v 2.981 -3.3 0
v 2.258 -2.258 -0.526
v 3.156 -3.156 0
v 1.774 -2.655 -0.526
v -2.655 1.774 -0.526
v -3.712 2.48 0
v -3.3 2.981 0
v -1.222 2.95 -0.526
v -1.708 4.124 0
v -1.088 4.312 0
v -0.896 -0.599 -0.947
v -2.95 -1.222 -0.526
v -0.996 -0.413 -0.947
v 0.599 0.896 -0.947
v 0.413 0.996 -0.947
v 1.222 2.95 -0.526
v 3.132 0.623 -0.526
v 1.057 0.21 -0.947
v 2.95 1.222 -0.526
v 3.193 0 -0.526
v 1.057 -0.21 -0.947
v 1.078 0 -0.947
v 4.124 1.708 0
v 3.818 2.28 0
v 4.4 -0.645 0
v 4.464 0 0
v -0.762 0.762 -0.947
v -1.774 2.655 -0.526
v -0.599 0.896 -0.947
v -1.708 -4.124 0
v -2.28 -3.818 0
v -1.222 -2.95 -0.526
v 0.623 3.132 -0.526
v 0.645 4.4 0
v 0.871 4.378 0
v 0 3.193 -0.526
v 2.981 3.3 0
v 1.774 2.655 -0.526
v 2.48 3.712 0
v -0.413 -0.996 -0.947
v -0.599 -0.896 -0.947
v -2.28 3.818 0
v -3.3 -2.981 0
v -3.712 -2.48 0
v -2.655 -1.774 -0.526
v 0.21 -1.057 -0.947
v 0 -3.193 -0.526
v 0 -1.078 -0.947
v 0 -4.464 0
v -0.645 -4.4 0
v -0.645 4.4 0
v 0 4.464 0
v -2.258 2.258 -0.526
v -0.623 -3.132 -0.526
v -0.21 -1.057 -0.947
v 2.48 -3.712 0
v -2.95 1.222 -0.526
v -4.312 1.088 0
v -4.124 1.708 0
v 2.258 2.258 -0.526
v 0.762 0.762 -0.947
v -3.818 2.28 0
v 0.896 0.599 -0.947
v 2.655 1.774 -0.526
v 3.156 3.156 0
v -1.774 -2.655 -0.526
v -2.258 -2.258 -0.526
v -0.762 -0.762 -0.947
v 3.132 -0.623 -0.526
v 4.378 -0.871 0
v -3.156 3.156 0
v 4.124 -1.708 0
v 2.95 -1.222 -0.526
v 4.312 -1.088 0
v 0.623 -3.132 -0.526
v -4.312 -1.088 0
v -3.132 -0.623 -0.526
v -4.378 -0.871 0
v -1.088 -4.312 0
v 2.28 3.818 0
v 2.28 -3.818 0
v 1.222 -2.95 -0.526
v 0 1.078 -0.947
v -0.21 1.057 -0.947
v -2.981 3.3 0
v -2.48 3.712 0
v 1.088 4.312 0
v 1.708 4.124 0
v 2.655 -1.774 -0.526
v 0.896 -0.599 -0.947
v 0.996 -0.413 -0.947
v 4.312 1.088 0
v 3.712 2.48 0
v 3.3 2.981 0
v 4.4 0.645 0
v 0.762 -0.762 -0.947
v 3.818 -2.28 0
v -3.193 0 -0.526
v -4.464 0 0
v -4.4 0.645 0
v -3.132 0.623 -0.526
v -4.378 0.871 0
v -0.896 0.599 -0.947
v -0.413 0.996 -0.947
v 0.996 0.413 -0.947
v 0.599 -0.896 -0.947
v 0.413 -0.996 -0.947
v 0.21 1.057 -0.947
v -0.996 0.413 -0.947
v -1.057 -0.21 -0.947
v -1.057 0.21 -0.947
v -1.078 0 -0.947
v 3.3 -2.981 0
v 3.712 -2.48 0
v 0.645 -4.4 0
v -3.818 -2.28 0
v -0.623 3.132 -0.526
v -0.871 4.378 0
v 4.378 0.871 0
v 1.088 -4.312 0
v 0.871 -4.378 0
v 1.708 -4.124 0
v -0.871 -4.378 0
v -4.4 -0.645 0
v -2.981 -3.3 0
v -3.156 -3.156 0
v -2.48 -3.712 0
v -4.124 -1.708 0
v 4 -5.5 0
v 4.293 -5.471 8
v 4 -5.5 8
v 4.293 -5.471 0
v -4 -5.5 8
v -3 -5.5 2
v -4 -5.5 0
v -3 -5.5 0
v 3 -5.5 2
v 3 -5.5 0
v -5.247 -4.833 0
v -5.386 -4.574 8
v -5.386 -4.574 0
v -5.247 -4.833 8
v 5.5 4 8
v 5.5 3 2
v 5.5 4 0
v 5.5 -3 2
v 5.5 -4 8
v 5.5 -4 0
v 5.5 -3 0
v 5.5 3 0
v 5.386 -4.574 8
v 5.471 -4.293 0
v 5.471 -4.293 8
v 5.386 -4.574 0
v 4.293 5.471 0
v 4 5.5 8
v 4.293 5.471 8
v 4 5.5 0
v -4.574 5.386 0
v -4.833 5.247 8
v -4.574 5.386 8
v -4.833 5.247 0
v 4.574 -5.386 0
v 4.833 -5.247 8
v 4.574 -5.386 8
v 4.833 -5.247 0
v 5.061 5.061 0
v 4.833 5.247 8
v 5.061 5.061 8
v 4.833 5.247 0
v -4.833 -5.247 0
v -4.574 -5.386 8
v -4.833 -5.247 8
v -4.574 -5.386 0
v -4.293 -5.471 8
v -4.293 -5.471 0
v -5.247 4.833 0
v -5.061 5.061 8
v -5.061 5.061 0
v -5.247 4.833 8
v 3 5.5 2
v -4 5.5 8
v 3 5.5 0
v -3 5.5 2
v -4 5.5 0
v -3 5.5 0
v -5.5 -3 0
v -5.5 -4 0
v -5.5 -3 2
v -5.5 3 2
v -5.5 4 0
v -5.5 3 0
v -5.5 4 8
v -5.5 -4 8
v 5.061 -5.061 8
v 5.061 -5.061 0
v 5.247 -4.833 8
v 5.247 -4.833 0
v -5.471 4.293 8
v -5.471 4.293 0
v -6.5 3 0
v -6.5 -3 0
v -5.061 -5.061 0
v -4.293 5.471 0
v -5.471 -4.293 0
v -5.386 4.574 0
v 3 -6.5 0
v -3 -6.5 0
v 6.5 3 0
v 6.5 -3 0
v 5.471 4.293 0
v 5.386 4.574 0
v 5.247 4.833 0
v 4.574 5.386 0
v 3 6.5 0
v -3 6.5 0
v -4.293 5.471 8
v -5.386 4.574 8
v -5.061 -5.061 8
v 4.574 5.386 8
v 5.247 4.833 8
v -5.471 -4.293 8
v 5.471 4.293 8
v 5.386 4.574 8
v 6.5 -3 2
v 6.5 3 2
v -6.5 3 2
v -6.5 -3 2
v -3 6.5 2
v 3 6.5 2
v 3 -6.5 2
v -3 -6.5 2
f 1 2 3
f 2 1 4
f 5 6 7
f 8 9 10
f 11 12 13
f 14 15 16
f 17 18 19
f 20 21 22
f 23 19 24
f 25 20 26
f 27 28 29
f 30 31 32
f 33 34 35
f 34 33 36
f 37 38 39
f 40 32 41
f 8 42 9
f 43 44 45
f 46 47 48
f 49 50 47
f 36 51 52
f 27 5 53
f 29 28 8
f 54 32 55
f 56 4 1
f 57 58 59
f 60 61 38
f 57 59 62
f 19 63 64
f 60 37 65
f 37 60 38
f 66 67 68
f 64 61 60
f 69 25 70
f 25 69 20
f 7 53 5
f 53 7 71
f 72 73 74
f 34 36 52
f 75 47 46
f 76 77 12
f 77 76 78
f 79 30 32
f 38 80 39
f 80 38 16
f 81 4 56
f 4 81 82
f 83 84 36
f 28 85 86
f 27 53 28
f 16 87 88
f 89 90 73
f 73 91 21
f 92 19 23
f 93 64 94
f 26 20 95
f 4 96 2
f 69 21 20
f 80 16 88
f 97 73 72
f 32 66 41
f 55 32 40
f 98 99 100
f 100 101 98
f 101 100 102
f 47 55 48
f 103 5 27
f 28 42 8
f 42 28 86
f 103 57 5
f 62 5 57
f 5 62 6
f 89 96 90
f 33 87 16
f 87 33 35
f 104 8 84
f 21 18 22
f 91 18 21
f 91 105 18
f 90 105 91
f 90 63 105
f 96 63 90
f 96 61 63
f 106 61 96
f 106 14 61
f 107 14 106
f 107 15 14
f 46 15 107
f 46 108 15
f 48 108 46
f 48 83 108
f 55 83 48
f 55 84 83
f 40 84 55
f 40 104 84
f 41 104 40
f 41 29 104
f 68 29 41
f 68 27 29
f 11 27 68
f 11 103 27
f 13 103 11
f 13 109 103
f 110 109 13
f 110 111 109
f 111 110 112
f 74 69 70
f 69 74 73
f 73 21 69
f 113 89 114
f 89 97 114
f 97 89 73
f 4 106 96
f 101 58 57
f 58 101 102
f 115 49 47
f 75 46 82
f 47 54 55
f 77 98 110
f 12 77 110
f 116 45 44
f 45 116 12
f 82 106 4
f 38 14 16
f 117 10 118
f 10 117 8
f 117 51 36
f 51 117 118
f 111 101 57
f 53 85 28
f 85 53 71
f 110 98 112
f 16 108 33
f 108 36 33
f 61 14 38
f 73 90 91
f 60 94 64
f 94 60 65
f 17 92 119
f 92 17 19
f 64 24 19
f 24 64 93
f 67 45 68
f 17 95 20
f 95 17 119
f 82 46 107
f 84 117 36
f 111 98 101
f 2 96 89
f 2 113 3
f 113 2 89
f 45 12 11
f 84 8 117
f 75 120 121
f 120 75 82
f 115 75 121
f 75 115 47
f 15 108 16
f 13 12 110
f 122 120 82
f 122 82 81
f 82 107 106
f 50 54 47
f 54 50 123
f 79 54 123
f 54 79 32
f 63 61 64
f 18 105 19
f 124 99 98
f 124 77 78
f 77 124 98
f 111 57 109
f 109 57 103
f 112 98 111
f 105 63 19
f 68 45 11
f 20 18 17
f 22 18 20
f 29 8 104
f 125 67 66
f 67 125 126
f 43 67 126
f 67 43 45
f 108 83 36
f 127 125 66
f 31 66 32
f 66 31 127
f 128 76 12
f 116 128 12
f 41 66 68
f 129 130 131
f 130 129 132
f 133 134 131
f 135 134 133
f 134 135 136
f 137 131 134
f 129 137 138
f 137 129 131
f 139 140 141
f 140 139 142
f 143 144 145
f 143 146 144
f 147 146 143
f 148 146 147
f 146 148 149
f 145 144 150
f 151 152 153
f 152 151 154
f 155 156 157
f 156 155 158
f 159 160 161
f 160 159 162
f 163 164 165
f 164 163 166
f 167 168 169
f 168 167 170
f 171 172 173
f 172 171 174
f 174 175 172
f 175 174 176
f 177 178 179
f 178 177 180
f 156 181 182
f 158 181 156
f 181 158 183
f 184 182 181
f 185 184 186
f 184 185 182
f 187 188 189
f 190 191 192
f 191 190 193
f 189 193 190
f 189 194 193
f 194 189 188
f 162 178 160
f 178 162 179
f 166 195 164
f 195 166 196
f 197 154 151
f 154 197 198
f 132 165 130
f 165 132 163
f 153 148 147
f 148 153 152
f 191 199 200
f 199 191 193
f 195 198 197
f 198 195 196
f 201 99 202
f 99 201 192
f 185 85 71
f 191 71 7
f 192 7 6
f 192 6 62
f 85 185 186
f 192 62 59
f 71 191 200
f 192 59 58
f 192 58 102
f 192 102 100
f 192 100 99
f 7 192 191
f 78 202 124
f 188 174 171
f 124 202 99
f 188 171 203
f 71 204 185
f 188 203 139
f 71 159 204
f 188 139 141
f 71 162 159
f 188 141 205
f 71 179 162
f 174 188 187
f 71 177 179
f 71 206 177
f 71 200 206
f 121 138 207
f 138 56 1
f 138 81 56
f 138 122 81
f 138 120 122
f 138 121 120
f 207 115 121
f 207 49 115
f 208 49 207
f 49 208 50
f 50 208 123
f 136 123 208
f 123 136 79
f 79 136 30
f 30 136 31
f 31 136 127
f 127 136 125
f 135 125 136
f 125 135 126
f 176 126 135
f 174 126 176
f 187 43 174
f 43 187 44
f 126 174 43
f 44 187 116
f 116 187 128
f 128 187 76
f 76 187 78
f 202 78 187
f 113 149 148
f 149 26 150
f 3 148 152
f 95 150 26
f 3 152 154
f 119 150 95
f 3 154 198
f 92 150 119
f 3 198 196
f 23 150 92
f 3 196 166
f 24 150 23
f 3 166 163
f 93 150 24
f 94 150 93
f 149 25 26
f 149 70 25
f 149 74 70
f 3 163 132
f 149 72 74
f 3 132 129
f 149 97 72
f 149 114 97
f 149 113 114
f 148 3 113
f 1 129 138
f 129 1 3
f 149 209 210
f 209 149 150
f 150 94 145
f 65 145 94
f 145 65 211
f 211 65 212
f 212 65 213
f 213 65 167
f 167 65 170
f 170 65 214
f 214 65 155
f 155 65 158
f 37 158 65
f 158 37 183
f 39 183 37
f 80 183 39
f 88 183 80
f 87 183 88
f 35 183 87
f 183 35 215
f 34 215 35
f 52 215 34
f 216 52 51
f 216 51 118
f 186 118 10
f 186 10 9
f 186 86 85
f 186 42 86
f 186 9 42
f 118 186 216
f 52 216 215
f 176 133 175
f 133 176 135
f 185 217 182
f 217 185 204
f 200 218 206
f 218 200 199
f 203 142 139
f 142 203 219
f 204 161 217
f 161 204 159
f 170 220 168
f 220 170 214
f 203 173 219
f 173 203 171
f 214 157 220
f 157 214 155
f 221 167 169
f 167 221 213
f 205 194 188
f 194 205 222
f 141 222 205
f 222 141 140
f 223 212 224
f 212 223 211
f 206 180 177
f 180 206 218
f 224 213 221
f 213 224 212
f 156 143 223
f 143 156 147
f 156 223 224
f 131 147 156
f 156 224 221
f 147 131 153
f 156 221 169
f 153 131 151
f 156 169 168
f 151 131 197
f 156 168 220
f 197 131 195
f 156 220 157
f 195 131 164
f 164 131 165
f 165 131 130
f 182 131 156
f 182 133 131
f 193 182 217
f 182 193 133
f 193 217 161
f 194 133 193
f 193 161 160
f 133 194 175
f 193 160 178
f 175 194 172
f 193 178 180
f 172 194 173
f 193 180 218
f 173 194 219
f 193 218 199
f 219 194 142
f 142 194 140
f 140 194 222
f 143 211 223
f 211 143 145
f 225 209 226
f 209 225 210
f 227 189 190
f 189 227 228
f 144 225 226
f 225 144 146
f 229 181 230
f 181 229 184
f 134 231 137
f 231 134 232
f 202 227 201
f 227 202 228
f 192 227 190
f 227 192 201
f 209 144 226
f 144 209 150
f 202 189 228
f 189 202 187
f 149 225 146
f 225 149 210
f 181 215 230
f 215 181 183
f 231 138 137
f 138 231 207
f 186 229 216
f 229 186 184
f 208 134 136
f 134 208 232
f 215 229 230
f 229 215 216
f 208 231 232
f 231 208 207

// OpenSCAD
res = 32;

module button() {
    union() {
        hull() {
            for(x=[-1, 1]) {
                for(y=[-1, 1]) {
                    translate([4*x, 4*y, 0]) cylinder(d=3, h=8, $fn=res);
                }
            }
        }
        translate([0, 0, 1]) cube([13, 6, 2], center=true);
        translate([0, 0, 1]) cube([6, 13, 2], center=true);
        difference() {
            translate([0, 0, 10]) sphere(d=22, $fn=res);
            for(i=[-1, 1]) {
                translate([i*10, 0, 5]) cube([10, 20, 10], center=true);
                translate([0, i*10, 5]) cube([20, 10, 10], center=true);
            }
            translate([0, 0, 15]) cube([30, 30, 20], center=true);
        }
    }
}

module button_base() {
    difference() {
        union() {
            translate([0, 0, 1]) cube([80, 78, 2], center=true);
            for(i=[-1, 1]) {
                for(j=[-1, 1]) {
                    translate([i*31, j*35.5, 0]) cylinder(d=13, h=13.7, $fn=res);
                }
                translate([0, 0, 2+3]) rotate([0, 0, i*49]) cube([84, 6, 6], center=true);
                translate([i*31, 0, 2+3]) cube([6, 60, 6], center=true);
                translate([0, i*35.5, 2+3]) cube([51, 6, 6], center=true);
            }
        }
        for(i=[-1, 1]) {
            for(j=[-1, 1]) {
                translate([i*31, j*35.5, -1]) cylinder(d=3.5, h=17, $fn=res);
                translate([i*31, j*35.5, 11.2]) cylinder(d=6.7, h=5, $fn=6);
            }
        }
        translate([0, -42, 0]) cube([100, 5, 50], center=true);
    }
}

module case() {
    union() {
        difference() {
            union() {
                for(x=[-1, 1]) for(y=[-1, 1]) {
                   translate([x*(88-13)/2, y*(182-13)/2, 3]) {
                        difference() {
                            cylinder(d=10, h=34, $fn=res);  
                            translate([x*-5, 0, 40]) rotate([0, 45, 0]) cube([20, 20, 20], center=true);
                            translate([0, 0, 25]) cylinder(d=6.7, h=20, $fn=6);
                        }
                   }
                   translate([x*31, -48+y*35.5, 57-(3.35+3)]) cylinder(d=7, h=3.35, $fn=res);
               }
            }
            for(x=[-1, 1]) for(y=[-1, 1]) {
                translate([x*(88-13)/2, y*(182-13)/2, 1]) cylinder(d=3.5, h=55, $fn=res);
                translate([x*31, -48+y*35.5, 57-24]) cylinder(d=3.5, h=26, $fn=res);
                translate([x*31, -48+y*35.5, 57-3.3]) cylinder(d=5.8, h=5, $fn=res);
            }
        }
        difference() {
            translate([0, 0, 57/2]) render(convexity=2) hull() { for(x=[-1, 1]) for(y=[-1, 1]) for(z=[-1, 1]) translate([x*(88-10)/2, y*(182-10)/2, z*(57-10)/2]) sphere(d=10, $fn=res); }
            //translate([0, 0, 57/2]) cube([88, 182, 57], center=true);
            translate([0, 0, 57/2]) render(convexity=2) hull() { for(x=[-1, 1]) for(y=[-1, 1]) for(z=[-1, 1]) translate([x*(88-10)/2, y*(182-10)/2, z*(57-10)/2]) sphere(d=4, $fn=res); }
            //translate([0, 0, 57/2]) cube([88-6, 182-6, 57-6], center=true);
            for(x=[-3,3]) {
                for(y=[-3,3]) {
                    translate([x*10, y*10+46, 10]) cylinder(d=3.5, h=60, $fn=res);
                }
            }
            // Speaker holes
            translate([0, 46, 10]) {
                //cylinder(d=6, h=60, $fn=res);
                for(i=[0:2]) {
                    rotate([0, 0, i*120]) translate([0, 4, 0]) cylinder(d=6, h=60, $fn=res);
                }
                for(i=[0:8]) {
                    rotate([0, 0, i*40+20]) translate([0, 11, 0]) cylinder(d=6, h=60, $fn=res);
                }
                for(i=[0:14]) {
                    rotate([0, 0, i*24]) translate([0, 18, 0]) cylinder(d=6, h=60, $fn=res);
                }
                for(i=[0:19]) {
                    rotate([0, 0, i*18+9]) translate([0, 25, 0]) cylinder(d=6, h=60, $fn=res);
                }
                for(i=[0:23]) {
                    rotate([0, 0, i*15]) translate([0, 32, 0]) cylinder(d=6, h=60, $fn=res);
                }
            }
            
            translate([0, -100, 22]) rotate([-90, 0, 0]) cylinder(d=4, h=50, $fn=res);
            translate([-25, 0, 10]) {
                difference() {
                    cylinder(d=6.7+0.4, h=60, $fn=res);
                    for(i=[-1, 1]) {
                        translate([0, i*((5.9+0.4)/2+5), 48]) cube([10, 10, 10], center=true);
                    }
                }
            }
            translate([20, 0, 10]) cylinder(d=5.5, h=60, $fn=res);
            translate([28, -9.3/2, 10]) cube([4, 9.3, 60]);
            for(x=[0:3]) {
                for(y=[0:3]) {
                    hull() {
                        for(i=[-1, 1]) {
                            for(j=[-1, 1]) {
                                translate([-24+x*14.8+4*i, -73+y*14.8+4*j, 53]) cylinder(d=3.5, h=6, $fn=res);
                            }
                        }
                    }
                }
            }
            //translate([0, -45, 0]) cube([58.5, 69.5, 20], center=true);
            for(x=[-1, 1]) for(y=[-1, 1]) {
                translate([x*(88-13)/2, y*(182-13)/2, -1]) {
                    cylinder(d=3.5, h=44, $fn=res);
                    cylinder(d=5.8, h=4, $fn=res);
                }
                translate([x*31, -48+y*35.5, 57-3.3]) cylinder(d=5.8, h=5, $fn=res);
            }
        }
    }
}

module upper_half() {
    difference() {
        case();
        translate([0, 0, -5]) cube([85, 179, 57], center=true);
        translate([0, 0, -7]) cube([100, 200, 57], center=true);
        //translate([-100, -100, -100]) cube([100, 200, 200]);
    }
}

module lower_half() {
    difference() {
        case();
        difference() {
            translate([0, 0, 50]) cube([100, 200, 57], center=true);
            translate([0, 0, -5]) cube([84.5, 178.5, 56.8], center=true);
        }
        translate([30, 15, 50-28-2.8]) cube([24.2, 24.2, 5]);
        //translate([-100, -100, -100]) cube([100, 200, 200]);
    }
}

button();
//upper_half();
//lower_half();
/*for(x=[0:3]) {
    for(y=[0:3]) {
        translate([-24+x*14.8, -73+y*14.8, 52]) button();
    }
}*/
//translate([0, -48, 52-1.35]) rotate([0, 180, 0]) button_base();
